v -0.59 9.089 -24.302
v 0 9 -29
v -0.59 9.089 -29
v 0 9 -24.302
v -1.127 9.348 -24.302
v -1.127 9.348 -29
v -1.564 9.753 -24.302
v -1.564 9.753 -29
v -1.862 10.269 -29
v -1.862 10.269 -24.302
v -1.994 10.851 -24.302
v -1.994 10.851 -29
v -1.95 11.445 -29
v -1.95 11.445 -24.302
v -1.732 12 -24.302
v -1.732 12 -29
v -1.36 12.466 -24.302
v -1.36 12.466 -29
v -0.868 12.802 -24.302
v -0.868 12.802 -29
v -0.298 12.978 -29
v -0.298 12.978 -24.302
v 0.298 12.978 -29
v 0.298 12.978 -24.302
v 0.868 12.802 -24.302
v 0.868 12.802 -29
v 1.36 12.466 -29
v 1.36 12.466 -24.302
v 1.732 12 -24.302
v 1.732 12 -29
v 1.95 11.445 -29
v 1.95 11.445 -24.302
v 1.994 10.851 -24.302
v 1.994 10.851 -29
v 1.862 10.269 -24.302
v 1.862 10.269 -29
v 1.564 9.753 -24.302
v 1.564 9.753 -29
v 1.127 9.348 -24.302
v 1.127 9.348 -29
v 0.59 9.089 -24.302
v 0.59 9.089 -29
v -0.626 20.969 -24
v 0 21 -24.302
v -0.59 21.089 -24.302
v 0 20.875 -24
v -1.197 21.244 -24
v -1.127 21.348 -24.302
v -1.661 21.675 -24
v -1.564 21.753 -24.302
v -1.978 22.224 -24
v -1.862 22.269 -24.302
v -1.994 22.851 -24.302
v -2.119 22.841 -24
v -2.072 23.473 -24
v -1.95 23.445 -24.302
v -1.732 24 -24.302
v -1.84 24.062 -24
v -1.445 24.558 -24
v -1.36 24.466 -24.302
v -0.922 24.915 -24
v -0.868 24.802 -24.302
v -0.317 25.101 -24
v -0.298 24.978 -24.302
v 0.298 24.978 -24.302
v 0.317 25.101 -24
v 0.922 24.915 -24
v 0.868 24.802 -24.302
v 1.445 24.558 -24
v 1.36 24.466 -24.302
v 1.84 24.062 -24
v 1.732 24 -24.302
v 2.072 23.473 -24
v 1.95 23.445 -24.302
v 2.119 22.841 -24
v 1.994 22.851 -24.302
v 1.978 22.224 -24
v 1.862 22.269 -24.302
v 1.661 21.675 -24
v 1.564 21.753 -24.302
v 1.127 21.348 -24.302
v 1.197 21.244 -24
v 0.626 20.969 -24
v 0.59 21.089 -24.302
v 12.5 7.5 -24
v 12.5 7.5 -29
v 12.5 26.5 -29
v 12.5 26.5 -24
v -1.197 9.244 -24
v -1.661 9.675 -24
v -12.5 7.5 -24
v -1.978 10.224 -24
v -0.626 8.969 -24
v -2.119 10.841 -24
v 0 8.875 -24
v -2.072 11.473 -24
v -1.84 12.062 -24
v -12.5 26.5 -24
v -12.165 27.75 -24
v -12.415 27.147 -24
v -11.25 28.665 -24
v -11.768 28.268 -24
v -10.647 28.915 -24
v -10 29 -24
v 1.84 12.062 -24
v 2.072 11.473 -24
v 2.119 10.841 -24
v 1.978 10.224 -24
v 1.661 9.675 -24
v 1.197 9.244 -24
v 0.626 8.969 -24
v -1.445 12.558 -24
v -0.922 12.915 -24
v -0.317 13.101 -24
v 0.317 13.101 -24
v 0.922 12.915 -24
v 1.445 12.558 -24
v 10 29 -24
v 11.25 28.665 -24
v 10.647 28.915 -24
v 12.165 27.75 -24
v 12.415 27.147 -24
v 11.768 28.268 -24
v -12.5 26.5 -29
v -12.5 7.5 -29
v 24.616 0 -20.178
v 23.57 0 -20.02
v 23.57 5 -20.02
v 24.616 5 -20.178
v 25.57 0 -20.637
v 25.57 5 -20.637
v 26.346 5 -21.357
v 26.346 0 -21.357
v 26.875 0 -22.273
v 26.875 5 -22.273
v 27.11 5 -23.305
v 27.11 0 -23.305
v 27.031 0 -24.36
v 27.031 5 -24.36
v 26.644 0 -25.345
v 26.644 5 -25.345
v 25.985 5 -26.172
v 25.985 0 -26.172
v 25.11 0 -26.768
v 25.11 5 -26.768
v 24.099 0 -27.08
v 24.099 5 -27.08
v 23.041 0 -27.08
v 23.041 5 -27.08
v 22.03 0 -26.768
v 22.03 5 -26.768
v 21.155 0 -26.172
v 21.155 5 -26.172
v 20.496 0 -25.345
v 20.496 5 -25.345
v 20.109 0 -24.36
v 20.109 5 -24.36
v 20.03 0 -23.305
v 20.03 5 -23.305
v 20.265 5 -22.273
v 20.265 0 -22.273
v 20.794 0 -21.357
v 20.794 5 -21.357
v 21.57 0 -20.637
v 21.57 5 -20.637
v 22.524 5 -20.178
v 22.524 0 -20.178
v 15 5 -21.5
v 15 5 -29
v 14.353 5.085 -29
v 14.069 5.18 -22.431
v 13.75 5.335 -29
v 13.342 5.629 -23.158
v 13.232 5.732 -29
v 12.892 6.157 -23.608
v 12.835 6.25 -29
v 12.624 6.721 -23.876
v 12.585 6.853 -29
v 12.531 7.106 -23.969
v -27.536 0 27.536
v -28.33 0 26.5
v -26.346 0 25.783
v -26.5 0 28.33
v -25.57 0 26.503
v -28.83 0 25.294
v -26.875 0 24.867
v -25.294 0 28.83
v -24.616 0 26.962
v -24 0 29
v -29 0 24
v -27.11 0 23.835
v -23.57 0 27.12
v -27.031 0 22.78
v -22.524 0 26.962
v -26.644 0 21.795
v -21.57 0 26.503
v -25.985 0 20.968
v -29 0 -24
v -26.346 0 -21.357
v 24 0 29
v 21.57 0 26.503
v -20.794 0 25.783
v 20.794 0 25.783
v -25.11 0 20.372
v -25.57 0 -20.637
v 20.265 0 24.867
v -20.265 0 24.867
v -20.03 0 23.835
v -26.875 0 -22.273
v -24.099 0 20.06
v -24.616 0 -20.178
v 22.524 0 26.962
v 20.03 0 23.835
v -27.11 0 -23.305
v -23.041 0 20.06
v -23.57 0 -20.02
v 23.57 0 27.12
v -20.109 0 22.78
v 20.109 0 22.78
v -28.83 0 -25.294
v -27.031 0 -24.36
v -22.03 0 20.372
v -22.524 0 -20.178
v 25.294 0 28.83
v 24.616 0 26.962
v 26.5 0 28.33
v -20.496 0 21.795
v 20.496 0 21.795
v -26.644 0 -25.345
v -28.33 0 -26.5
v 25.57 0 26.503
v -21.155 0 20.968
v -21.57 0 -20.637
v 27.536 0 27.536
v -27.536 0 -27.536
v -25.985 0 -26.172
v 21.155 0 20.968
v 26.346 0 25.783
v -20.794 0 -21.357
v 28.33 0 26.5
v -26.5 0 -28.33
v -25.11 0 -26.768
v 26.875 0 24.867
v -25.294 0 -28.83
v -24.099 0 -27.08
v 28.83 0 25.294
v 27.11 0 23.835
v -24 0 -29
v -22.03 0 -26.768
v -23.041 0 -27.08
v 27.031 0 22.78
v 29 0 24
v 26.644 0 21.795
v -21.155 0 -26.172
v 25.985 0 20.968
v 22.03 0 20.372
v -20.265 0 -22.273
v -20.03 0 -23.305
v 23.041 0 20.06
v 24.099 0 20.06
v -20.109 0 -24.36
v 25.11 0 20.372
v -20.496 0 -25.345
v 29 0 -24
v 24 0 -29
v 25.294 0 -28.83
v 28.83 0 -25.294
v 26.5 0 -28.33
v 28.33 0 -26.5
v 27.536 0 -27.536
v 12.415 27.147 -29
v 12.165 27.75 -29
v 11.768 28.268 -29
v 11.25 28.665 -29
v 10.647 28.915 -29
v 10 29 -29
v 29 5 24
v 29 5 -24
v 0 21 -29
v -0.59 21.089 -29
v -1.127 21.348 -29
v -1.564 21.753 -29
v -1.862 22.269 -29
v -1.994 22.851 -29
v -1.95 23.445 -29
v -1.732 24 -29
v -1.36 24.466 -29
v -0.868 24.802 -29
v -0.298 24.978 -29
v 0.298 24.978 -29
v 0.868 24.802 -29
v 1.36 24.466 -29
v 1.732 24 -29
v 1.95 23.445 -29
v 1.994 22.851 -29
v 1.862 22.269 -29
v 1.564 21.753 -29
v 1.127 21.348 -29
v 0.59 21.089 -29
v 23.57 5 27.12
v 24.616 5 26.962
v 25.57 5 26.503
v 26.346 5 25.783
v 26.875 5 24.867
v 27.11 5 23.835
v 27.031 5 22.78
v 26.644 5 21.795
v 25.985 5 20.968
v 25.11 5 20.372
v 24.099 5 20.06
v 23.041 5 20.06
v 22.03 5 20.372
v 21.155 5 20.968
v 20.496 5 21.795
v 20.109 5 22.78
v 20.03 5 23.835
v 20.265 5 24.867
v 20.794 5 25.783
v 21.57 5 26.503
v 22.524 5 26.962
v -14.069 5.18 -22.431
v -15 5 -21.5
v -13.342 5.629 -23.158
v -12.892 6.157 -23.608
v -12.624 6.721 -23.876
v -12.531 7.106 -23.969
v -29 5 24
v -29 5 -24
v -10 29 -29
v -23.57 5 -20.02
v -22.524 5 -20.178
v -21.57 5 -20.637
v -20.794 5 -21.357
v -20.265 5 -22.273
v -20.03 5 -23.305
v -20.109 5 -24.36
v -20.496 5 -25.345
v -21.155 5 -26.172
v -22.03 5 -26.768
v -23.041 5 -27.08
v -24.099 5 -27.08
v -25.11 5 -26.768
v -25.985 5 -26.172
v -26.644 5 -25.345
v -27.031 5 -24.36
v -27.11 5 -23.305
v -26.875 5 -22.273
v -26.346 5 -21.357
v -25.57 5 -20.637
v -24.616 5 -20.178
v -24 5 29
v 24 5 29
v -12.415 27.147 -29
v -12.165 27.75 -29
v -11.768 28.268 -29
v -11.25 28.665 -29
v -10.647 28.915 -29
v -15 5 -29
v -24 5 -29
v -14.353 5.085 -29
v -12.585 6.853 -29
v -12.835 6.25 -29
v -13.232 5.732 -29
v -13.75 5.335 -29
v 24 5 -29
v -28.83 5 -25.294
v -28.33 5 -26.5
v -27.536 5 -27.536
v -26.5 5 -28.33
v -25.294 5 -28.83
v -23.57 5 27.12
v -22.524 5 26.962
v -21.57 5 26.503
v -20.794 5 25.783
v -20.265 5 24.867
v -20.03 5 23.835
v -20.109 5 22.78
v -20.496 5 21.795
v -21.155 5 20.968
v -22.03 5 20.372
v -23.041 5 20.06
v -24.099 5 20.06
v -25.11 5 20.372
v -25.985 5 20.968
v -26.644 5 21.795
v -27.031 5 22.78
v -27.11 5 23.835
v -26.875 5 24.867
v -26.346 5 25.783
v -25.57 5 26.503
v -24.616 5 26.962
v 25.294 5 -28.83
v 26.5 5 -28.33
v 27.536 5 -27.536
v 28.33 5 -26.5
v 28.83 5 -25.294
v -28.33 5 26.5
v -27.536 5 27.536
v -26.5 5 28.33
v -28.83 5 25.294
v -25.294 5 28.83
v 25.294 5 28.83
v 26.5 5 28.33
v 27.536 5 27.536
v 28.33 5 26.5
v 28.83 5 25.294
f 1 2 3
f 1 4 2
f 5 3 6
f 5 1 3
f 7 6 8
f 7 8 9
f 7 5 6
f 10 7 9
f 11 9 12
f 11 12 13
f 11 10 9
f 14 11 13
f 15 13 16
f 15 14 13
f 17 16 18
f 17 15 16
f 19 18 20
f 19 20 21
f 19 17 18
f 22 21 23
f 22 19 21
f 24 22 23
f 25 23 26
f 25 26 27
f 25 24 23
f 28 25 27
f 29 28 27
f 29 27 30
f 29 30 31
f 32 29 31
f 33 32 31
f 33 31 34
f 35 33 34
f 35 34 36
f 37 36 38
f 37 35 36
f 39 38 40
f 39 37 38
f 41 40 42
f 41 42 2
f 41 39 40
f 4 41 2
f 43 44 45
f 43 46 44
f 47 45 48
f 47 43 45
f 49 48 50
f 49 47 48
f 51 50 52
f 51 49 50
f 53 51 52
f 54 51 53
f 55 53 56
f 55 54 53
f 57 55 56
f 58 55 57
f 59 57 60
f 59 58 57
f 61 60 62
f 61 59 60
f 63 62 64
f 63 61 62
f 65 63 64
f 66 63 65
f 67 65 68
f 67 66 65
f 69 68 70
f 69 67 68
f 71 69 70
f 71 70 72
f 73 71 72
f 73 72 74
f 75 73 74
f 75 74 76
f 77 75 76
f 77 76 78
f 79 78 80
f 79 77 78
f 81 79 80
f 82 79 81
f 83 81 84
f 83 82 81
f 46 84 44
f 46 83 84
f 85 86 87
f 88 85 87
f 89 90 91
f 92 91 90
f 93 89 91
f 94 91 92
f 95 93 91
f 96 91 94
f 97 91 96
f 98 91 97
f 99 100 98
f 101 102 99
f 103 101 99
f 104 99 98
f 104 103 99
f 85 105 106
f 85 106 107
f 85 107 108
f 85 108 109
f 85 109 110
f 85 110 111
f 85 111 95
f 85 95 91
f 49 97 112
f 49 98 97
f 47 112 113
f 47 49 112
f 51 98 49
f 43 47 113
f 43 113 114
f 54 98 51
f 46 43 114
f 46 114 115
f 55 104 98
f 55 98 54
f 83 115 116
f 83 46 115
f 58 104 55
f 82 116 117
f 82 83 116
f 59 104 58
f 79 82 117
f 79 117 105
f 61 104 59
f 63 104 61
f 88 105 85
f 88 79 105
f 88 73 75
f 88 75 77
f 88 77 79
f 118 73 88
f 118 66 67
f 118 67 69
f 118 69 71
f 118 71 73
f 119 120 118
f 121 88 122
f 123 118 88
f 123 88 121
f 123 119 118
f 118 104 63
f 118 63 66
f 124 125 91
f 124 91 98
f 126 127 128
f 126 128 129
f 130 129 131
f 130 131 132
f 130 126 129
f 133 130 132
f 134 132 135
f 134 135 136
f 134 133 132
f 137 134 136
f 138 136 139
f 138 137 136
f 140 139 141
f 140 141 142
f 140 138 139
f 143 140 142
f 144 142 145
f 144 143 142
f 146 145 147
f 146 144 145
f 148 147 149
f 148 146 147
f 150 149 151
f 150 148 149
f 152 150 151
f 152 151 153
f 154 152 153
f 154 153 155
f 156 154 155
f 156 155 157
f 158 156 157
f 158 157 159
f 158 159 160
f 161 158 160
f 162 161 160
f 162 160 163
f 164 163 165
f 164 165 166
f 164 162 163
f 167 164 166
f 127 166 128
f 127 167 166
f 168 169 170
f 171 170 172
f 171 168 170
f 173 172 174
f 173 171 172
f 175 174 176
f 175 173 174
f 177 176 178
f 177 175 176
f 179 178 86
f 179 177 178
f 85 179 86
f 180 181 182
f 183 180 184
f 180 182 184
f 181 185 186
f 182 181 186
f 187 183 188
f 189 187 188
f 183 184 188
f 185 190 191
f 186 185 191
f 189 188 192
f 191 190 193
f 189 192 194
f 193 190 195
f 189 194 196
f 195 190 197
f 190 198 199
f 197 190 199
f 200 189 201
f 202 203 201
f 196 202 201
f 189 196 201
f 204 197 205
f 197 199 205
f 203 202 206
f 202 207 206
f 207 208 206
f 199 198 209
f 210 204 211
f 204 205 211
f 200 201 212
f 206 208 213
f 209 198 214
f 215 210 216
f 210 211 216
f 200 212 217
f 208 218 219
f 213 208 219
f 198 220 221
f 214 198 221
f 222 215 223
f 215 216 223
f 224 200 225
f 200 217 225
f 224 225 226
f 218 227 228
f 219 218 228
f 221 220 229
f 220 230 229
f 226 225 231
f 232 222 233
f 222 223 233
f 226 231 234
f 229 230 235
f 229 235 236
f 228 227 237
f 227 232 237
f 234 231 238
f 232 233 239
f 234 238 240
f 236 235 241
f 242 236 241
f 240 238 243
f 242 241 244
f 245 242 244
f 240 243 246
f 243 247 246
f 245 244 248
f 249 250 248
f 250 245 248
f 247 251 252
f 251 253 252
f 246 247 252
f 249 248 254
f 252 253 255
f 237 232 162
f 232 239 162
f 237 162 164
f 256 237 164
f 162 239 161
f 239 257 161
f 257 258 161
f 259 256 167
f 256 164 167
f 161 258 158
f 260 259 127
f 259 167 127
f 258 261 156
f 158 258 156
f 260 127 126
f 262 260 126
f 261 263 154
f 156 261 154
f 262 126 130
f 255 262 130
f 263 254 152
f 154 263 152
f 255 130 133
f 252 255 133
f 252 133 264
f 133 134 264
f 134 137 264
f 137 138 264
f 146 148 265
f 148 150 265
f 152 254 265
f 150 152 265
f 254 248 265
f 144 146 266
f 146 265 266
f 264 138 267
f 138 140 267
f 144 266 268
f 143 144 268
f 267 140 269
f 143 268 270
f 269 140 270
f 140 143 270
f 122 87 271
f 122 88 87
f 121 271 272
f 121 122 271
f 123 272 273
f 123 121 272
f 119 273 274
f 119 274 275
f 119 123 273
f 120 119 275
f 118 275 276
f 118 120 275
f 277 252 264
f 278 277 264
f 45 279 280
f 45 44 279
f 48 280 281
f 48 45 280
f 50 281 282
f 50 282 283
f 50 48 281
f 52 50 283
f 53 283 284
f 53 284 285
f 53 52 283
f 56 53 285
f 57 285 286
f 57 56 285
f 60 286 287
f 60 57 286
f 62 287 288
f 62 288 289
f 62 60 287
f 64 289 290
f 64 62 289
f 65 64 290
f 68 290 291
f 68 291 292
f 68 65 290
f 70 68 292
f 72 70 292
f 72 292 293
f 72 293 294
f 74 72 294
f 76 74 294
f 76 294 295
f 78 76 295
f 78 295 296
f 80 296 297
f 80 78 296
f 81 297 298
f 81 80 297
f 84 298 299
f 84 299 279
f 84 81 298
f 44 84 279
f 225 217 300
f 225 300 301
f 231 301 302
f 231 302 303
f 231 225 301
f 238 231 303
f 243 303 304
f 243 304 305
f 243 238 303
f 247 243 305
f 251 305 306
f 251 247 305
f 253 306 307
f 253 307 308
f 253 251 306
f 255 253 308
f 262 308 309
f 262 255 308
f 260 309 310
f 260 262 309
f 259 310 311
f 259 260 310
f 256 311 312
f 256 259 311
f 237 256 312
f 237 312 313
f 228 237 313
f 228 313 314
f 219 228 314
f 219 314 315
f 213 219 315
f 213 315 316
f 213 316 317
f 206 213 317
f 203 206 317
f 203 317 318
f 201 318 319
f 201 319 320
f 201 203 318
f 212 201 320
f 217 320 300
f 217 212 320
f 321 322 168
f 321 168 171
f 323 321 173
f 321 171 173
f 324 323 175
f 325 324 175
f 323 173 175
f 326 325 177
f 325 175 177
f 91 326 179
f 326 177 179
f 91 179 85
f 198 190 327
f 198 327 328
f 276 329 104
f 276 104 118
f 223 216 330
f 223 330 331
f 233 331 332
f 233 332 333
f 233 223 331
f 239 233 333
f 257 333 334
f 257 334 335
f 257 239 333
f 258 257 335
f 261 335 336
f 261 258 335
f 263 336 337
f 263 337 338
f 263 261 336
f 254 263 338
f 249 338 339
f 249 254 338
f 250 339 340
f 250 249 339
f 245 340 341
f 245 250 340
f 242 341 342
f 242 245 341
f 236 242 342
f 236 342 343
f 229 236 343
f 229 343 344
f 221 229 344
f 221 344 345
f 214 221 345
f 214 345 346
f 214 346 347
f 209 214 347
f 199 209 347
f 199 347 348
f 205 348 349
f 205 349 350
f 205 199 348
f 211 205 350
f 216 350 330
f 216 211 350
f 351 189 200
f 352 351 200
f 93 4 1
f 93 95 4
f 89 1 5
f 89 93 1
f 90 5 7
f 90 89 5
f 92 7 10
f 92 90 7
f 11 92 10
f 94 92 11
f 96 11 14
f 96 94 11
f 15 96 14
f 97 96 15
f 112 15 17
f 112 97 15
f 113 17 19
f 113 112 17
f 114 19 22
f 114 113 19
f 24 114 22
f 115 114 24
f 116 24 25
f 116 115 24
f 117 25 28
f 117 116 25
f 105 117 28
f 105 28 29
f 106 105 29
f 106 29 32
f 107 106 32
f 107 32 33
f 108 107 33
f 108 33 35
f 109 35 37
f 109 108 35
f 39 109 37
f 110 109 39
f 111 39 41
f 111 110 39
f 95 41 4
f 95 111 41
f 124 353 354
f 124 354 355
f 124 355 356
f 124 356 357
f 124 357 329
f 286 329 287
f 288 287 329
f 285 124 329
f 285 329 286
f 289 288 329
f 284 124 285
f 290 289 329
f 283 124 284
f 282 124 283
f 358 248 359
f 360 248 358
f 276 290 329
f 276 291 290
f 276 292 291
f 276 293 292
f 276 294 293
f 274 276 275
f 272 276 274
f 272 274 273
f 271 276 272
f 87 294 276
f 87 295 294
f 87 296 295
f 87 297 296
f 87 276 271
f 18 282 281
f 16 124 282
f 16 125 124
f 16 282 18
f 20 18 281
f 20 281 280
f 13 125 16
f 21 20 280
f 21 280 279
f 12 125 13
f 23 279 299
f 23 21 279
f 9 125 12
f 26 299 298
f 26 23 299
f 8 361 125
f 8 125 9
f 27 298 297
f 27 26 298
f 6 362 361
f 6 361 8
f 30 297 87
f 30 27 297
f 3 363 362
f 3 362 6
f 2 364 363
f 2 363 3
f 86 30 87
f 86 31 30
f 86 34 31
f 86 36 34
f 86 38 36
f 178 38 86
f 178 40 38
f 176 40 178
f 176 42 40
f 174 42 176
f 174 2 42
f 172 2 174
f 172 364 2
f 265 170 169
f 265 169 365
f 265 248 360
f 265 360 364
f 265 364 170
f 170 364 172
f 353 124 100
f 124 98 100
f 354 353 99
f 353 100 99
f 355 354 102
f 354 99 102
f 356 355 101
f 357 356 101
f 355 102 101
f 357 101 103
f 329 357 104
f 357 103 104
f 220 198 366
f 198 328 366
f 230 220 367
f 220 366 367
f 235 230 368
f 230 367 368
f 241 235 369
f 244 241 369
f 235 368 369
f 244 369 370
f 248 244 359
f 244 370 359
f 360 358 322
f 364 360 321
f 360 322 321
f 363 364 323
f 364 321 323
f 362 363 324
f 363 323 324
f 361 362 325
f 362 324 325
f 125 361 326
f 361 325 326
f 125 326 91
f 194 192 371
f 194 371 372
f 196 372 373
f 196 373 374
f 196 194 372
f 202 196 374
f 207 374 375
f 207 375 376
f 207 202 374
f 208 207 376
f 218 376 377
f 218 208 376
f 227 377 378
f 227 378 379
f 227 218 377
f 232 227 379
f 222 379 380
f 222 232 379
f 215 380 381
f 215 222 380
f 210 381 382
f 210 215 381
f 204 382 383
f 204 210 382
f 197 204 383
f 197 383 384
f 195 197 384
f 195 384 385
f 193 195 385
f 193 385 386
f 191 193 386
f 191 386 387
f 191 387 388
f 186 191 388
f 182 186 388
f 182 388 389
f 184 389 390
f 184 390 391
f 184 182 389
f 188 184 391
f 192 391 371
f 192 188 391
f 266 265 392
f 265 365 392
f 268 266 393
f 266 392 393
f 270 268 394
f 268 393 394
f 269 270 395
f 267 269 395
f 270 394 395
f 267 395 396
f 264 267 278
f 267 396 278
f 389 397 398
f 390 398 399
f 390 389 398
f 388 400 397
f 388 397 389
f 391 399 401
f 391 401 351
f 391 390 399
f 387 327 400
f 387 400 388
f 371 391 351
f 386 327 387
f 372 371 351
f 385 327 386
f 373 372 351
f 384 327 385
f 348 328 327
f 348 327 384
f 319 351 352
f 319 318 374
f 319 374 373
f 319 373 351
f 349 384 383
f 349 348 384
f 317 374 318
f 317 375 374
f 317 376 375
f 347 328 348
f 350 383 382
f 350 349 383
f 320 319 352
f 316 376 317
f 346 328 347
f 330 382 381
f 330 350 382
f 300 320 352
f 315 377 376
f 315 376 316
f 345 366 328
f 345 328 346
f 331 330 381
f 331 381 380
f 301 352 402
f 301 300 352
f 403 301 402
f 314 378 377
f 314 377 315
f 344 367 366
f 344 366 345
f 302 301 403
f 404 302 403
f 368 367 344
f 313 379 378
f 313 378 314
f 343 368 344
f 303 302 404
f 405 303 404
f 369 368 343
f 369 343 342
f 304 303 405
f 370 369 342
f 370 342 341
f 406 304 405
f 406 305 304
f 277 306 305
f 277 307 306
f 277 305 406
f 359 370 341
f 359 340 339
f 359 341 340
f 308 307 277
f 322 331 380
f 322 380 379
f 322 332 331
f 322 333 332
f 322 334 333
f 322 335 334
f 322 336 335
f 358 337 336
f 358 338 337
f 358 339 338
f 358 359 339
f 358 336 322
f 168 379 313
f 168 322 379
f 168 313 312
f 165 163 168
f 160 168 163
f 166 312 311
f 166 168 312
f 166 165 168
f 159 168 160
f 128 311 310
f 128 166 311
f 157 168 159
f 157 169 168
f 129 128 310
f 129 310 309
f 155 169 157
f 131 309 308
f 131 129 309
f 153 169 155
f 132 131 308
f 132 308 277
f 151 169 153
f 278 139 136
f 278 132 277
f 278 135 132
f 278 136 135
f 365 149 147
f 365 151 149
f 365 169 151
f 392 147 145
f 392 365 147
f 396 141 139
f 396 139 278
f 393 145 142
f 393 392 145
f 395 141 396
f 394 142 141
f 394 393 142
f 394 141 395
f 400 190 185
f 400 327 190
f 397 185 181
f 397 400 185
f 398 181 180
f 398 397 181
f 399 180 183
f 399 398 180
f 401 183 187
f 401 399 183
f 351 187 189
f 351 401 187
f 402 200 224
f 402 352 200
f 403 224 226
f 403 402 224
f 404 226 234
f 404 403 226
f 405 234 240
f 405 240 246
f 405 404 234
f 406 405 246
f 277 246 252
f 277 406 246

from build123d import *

# Parameters (mm, degrees)
SKETCH1_W                         = 58
SKETCH1_H                         = 58
SKETCH1_R                         = 3.55
BOSS_EXTRUDE1_DEPTH               = 5
FILLET1_R                         = 5
BOSS_EXTRUDE2_START               = -29
SKETCH5_W                         = 25
SKETCH5_H                         = 24
BOSS_EXTRUDE2_DEPTH               = 5
F_4_0_4_DIAMETER_HOLE1_AT_2_COUNT = 2
F_4_0_4_DIAMETER_HOLE1_AT_2_PITCH = 12
FILLET2_R                         = 2.5


with BuildPart() as part:
    # Sketch1 → Boss-Extrude1 (new body)
    with BuildSketch(Plane(origin=(0, 0, 0), x_dir=(1, 0, 0), z_dir=(0, 1, 0))):
        Rectangle(SKETCH1_W, SKETCH1_H)
        with Locations(Location((-23.57, 23.57, 0), (0, 0, 270))):
            Circle(SKETCH1_R, mode=Mode.SUBTRACT)
        with Locations(Location((23.57, 23.57, 0), (0, 0, 270))):
            Circle(SKETCH1_R, mode=Mode.SUBTRACT)
        with Locations(Location((23.57, -23.57, 0), (0, 0, 270))):
            Circle(SKETCH1_R, mode=Mode.SUBTRACT)
        with Locations(Location((-23.57, -23.57, 0), (0, 0, 270))):
            Circle(SKETCH1_R, mode=Mode.SUBTRACT)
    extrude(amount=BOSS_EXTRUDE1_DEPTH)

    # Fillet1
    fillet1_edges = [part.edges().sort_by_distance(p)[0] for p in [
        (29, 2.5, 29),
        (-29, 2.5, 29),
        (-29, 2.5, -29),
        (29, 2.5, -29),
    ]]
    fillet(fillet1_edges, radius=FILLET1_R)

    # Sketch5 → Boss-Extrude2 (add)
    with BuildSketch(Plane.XY.offset(BOSS_EXTRUDE2_START)):
        with Locations((0, 17)):
            Rectangle(SKETCH5_W, SKETCH5_H)
    extrude(amount=BOSS_EXTRUDE2_DEPTH)

    # Sketch7 → Ø4.0 (4) Diameter Hole1 (revolve, cut)
    with BuildSketch(Plane(origin=(0, 11, -24), x_dir=(0, -1, 0), z_dir=(1, 0, 0))):
        Polygon((0, 0), (0, 5), (2, 5), (2, 0.301776695), (2.125, 0), align=None)
    f_4_0_4_diameter_hole1 = revolve(axis=Axis((0, 11, -17.65), (0, 0, -1)), mode=Mode.SUBTRACT)

    # Ø4.0 (4) Diameter Hole1 at 2: Ø4.0 (4) Diameter Hole1 ×2
    with Locations(*[(0, i * F_4_0_4_DIAMETER_HOLE1_AT_2_PITCH, 0) for i in range(1, F_4_0_4_DIAMETER_HOLE1_AT_2_COUNT)]):
        add(f_4_0_4_diameter_hole1, mode=Mode.SUBTRACT)

    # Fillet2
    fillet2_edges = [part.edges().sort_by_distance(p)[0] for p in [
        (-12.5, 5, -26.5),
        (12.5, 5, -26.5),
        (12.5, 29, -26.5),
        (-12.5, 29, -26.5),
        (0, 5, -24),
    ]]
    fillet(fillet2_edges, radius=FILLET2_R)


solid = part.part
